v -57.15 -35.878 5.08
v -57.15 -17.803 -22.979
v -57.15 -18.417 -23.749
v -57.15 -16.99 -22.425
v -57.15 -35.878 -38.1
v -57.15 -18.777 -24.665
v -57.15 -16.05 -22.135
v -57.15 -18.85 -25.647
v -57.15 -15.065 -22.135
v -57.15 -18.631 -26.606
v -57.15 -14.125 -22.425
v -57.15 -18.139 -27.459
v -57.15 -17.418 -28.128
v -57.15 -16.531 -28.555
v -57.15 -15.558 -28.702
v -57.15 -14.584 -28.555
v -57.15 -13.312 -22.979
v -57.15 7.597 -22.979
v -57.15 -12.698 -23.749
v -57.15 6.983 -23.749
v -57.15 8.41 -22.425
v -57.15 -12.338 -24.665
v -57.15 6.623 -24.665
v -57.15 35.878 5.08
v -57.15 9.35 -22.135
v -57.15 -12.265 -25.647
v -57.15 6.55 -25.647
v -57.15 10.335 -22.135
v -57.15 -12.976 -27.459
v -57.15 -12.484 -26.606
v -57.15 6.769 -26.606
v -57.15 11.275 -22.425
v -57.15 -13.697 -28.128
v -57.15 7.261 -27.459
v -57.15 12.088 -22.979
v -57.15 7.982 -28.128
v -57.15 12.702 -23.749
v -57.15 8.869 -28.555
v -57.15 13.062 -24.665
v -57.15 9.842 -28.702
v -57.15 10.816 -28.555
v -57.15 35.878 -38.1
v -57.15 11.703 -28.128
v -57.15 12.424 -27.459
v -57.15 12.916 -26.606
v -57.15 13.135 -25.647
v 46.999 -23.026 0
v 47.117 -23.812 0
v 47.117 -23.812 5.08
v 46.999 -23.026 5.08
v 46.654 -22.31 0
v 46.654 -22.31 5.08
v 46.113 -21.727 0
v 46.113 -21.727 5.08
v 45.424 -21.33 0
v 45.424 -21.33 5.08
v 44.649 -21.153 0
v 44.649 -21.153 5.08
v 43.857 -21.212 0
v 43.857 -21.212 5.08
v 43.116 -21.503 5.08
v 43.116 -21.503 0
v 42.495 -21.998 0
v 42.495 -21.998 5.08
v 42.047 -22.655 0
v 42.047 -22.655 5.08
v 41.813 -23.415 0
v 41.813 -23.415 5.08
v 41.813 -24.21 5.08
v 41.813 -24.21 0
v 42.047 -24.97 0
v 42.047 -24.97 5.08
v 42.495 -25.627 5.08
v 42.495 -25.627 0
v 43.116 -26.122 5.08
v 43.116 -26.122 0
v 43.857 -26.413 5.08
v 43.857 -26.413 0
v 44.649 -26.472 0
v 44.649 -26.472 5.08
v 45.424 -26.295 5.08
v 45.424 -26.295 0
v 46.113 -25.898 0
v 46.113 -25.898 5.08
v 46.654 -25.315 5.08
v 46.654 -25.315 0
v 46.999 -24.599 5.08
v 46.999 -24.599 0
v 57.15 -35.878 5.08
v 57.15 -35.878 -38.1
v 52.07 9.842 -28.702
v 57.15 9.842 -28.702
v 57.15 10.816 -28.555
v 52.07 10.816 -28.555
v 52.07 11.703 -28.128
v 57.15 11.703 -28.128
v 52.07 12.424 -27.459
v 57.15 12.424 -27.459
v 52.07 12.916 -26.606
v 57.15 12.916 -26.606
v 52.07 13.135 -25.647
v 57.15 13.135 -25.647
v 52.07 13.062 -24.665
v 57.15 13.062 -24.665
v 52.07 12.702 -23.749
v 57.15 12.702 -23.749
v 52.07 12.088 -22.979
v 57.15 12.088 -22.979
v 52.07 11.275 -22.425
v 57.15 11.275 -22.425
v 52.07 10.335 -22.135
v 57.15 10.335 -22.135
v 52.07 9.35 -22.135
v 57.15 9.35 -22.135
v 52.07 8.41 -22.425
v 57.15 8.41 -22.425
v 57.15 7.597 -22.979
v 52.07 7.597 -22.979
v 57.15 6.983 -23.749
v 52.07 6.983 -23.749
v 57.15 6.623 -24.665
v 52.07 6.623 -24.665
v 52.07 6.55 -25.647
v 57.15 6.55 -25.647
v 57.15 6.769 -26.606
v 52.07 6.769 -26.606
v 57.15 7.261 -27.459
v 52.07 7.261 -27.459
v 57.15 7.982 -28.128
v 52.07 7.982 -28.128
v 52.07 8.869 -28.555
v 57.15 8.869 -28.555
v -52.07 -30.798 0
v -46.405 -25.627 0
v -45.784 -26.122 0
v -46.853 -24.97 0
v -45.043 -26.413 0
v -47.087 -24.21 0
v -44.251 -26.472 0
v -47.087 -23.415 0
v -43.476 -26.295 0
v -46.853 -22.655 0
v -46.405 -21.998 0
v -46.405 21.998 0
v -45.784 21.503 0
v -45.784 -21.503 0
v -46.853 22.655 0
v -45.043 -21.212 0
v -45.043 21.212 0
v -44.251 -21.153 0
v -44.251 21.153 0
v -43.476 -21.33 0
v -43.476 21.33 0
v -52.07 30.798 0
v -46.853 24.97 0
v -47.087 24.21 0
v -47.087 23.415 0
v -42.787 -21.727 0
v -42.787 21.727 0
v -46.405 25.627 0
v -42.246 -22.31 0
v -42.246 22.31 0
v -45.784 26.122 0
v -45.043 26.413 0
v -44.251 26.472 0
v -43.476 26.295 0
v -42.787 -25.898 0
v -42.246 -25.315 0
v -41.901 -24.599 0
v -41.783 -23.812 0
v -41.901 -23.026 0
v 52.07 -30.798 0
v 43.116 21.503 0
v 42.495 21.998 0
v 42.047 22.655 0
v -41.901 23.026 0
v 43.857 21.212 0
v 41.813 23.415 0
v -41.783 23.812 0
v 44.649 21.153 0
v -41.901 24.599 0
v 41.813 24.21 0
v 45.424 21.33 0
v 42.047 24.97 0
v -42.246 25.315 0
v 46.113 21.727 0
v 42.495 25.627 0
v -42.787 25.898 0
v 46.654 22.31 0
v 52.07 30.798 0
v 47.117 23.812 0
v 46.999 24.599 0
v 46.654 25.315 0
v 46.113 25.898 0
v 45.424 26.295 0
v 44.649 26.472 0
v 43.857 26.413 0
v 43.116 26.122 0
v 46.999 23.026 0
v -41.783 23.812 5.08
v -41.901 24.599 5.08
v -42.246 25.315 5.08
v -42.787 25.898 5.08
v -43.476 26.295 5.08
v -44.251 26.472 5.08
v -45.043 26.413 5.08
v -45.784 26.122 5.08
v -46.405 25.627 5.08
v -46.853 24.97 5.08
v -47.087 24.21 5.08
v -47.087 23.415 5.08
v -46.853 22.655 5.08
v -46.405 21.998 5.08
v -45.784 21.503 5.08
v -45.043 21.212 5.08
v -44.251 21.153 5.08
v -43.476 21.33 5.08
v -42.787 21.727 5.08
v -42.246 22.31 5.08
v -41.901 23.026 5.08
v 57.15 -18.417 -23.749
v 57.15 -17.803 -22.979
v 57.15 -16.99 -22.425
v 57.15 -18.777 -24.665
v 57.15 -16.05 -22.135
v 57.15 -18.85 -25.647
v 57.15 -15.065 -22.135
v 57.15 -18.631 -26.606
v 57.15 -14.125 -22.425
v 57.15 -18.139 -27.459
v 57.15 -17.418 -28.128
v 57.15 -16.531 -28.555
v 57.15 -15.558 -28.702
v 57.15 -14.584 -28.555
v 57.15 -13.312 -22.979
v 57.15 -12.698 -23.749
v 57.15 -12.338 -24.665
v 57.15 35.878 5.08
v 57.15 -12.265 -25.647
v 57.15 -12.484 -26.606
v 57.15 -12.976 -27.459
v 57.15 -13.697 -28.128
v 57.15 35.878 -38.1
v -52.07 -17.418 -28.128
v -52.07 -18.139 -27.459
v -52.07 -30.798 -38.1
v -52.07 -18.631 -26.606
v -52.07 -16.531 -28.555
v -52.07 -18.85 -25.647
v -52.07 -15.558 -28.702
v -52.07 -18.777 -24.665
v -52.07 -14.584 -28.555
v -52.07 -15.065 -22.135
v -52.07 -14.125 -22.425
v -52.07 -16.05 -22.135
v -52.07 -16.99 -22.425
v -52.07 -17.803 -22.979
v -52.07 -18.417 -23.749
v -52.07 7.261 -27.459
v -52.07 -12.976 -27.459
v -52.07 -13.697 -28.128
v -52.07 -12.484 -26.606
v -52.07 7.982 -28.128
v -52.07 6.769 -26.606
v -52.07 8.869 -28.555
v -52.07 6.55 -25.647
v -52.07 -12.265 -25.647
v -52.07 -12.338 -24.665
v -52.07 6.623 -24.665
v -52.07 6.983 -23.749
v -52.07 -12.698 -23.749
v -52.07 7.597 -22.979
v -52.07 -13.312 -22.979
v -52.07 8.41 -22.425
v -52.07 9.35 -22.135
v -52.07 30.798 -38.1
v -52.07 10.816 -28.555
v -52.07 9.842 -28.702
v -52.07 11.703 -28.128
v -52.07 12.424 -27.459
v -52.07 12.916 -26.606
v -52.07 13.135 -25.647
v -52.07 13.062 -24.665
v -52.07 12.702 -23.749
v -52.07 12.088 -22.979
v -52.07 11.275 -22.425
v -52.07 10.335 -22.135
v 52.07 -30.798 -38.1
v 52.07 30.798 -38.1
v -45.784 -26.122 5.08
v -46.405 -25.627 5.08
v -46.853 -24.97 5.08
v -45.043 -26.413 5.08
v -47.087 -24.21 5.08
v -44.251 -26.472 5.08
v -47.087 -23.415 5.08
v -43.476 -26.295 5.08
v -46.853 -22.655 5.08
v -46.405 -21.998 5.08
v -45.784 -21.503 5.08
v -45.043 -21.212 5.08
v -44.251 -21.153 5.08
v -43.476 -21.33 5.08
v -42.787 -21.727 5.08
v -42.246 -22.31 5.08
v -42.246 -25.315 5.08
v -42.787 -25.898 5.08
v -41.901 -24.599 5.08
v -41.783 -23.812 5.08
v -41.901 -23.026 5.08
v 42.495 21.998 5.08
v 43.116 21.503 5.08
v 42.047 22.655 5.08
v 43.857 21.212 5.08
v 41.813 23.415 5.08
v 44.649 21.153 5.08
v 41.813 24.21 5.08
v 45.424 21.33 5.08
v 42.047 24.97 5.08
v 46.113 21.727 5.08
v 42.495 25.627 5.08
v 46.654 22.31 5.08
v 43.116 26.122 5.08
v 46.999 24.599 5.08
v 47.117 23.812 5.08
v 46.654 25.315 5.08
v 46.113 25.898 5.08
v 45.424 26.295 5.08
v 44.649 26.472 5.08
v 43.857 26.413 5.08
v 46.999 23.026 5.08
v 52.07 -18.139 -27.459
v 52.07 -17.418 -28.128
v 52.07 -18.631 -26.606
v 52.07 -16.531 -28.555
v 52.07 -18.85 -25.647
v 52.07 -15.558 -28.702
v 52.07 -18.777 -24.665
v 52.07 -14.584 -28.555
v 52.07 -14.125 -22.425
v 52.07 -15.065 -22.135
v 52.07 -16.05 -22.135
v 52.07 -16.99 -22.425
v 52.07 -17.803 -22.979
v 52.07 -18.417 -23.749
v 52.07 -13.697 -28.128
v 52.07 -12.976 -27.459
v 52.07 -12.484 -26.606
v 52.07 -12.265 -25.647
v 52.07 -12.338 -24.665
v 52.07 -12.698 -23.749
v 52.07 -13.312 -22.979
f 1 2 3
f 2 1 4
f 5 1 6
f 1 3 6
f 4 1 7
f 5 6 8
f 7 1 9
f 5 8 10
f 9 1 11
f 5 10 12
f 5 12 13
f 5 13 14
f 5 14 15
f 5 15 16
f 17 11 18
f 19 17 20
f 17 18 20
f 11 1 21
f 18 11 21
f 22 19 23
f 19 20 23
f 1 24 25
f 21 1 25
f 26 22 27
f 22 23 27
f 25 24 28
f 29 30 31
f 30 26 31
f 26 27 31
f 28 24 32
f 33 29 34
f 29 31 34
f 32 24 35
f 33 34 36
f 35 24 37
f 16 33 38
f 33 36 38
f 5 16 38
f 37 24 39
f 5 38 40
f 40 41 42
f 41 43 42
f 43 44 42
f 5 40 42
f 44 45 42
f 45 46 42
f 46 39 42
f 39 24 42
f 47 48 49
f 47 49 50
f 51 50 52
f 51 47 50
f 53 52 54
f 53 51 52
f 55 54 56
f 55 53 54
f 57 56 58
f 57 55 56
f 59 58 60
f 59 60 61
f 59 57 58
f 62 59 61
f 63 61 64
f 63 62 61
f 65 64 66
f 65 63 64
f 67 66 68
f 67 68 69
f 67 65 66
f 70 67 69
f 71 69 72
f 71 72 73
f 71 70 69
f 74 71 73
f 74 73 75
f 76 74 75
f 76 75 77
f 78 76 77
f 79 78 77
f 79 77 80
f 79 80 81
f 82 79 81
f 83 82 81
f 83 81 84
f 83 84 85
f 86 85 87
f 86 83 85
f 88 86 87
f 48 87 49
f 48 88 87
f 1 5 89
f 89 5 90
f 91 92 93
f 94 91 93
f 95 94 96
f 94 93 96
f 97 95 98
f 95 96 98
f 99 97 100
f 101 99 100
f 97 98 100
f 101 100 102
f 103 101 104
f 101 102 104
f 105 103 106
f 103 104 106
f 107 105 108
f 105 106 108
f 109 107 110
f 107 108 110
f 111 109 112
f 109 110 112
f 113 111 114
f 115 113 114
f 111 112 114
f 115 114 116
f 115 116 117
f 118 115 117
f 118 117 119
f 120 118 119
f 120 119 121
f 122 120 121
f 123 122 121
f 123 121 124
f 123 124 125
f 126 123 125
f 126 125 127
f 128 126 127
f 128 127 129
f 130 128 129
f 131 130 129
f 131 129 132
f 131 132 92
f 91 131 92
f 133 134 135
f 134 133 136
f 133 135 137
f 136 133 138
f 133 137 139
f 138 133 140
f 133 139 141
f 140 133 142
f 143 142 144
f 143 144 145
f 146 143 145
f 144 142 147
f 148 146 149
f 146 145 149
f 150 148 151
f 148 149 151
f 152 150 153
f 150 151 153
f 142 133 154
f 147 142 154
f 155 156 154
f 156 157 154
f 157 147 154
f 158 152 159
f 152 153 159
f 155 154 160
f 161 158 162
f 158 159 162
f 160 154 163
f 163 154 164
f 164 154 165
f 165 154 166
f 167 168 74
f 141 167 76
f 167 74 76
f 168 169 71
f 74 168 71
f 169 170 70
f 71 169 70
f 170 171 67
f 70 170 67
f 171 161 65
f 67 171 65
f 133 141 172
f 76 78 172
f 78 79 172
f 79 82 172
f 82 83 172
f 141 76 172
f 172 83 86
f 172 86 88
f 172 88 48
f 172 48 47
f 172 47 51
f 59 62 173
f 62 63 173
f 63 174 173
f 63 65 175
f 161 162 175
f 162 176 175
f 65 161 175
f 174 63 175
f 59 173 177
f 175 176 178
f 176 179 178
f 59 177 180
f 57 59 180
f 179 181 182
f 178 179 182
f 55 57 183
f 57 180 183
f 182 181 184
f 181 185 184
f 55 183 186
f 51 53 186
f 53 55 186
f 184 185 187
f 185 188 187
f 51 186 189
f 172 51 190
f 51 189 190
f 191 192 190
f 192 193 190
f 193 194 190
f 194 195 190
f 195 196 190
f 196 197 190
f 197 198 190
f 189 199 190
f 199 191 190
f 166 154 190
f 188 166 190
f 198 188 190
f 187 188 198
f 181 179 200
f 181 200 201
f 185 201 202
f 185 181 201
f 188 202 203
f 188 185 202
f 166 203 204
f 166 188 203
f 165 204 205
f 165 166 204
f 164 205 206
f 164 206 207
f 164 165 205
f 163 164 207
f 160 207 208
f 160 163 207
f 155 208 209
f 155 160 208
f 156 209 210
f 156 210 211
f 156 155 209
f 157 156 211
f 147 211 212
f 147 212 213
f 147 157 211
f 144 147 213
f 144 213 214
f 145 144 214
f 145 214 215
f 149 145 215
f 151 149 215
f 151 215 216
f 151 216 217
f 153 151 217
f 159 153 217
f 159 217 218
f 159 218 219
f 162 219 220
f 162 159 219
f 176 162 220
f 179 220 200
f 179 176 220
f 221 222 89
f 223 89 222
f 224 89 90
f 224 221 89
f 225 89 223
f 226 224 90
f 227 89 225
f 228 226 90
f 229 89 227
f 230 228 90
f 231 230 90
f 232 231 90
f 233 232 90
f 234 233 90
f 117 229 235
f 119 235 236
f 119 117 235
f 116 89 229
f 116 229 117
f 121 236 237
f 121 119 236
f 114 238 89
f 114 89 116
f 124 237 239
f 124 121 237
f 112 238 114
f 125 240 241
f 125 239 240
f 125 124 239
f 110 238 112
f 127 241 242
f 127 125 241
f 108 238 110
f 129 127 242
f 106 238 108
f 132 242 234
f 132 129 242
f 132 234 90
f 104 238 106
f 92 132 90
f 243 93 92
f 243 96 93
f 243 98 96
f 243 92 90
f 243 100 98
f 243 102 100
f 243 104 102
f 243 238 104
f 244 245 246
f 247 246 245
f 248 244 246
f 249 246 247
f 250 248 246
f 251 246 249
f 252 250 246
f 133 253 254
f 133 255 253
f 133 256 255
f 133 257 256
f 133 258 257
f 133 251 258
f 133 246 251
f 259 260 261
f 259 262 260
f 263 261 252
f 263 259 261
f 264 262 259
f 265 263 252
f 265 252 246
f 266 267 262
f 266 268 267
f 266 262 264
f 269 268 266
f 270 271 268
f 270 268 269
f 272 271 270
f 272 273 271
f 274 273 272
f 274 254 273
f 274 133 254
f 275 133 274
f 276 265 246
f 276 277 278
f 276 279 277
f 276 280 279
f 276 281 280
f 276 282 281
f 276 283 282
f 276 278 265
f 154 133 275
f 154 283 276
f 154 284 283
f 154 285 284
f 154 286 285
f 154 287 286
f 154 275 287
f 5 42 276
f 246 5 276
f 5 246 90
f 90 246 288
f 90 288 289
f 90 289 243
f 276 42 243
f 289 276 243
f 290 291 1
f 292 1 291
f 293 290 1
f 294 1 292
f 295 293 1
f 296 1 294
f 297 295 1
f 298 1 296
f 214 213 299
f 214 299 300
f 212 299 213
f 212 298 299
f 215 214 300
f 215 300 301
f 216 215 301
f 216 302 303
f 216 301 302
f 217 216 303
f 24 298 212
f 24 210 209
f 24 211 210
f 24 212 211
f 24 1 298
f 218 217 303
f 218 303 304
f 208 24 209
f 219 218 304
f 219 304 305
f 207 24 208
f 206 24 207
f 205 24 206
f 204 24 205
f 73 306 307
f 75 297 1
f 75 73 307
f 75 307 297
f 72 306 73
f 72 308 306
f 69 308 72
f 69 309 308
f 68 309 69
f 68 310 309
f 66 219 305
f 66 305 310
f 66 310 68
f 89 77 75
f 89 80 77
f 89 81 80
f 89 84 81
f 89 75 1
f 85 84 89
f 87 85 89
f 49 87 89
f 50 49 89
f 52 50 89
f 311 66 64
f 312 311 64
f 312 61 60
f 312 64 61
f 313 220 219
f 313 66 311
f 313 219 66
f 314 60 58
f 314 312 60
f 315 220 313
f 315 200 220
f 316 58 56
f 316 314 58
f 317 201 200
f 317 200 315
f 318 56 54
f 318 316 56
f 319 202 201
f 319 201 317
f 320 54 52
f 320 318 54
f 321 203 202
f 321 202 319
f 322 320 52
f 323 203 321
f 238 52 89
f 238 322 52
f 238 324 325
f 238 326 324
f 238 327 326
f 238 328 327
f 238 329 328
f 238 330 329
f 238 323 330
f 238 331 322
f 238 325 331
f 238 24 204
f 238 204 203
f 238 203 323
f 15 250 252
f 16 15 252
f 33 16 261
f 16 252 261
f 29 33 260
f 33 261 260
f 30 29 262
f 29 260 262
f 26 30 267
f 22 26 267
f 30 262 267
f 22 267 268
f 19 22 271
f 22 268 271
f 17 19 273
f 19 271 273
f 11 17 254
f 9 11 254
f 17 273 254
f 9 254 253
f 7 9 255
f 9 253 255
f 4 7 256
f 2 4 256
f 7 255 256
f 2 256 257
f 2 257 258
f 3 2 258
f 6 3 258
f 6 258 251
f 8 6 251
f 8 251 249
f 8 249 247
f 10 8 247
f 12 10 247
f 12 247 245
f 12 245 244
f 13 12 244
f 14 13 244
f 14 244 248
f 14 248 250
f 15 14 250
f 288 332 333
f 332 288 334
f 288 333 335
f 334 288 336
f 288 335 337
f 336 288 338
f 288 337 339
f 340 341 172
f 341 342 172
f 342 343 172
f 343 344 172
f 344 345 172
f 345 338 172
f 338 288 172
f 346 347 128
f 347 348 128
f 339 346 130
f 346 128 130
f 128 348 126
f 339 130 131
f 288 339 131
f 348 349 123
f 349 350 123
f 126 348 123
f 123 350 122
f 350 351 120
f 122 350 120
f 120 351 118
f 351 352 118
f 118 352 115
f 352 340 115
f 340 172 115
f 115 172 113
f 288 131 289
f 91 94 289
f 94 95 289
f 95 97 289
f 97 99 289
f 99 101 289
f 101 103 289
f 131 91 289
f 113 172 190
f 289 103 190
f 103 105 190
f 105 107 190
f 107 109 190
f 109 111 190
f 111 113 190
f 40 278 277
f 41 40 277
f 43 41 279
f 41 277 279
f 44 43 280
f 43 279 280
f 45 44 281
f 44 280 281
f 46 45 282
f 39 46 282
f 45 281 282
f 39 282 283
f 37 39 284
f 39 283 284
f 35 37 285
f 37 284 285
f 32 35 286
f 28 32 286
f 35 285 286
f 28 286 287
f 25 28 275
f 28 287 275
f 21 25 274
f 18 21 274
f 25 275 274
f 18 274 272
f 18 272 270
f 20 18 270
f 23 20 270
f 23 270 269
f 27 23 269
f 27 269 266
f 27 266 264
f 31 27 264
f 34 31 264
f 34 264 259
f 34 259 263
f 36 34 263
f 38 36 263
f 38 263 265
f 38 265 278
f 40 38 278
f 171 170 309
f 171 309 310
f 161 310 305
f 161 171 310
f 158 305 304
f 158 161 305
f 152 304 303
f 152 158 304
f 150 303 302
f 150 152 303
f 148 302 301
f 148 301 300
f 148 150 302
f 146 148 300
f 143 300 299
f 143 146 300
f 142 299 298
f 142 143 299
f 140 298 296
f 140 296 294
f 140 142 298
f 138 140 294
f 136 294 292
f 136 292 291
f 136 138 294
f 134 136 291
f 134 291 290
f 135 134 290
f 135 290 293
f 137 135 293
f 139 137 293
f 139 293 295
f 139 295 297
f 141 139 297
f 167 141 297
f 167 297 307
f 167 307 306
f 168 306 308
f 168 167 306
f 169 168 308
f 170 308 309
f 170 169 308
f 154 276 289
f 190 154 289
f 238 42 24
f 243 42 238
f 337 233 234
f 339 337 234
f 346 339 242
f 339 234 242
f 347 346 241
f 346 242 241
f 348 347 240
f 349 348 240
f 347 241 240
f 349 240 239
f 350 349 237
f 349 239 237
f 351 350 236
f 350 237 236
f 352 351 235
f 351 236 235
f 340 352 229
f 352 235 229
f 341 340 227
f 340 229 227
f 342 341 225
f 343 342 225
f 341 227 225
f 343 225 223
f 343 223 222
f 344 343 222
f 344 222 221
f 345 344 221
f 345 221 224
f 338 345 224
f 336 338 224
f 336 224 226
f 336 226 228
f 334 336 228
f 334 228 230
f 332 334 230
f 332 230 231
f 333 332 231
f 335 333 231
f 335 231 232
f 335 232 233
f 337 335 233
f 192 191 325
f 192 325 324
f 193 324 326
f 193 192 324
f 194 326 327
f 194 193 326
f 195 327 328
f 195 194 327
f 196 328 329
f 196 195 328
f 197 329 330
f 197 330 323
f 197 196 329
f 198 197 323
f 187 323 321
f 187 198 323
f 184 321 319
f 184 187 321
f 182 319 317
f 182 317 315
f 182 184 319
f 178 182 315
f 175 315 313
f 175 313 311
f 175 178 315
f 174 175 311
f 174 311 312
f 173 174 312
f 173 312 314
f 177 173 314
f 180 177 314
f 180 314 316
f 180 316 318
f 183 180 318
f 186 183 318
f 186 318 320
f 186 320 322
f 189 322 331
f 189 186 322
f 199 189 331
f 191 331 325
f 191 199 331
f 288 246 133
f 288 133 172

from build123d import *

# Parameters (mm, degrees)
SKETCH1_W           = 5.08
SKETCH1_H           = 61.595
SKETCH1_W_2         = 104.14
SKETCH1_R           = 2.667
BOSS_EXTRUDE1_DEPTH = 5.08
SKETCH1_3_W         = 5.08
SKETCH1_3_H         = 61.595
BOSS_EXTRUDE2_DEPTH = 38.1
SKETCH2_R           = 3.302
CUT_EXTRUDE1_DEPTH  = 125.356688627
SKETCH3_W           = 114.3
SKETCH3_H           = 43.18
BOSS_EXTRUDE3_DEPTH = 5.08
BOSS_EXTRUDE4_START = -61.595
SKETCH3_3_W         = 114.3
SKETCH3_3_H         = 43.18
BOSS_EXTRUDE4_DEPTH = 5.08


with BuildPart() as part:
    # Sketch1 → Boss-Extrude1 (new body)
    # profile 1 of 3: a face of its own
    with BuildSketch(Plane.XY):
        with Locations((-54.61, 0)):
            Rectangle(SKETCH1_W, SKETCH1_H)
    # profile 2 of 3: a face of its own
    with BuildSketch(Plane.XY):
        Rectangle(SKETCH1_W_2, SKETCH1_H)
        with Locations((-44.45, -23.8125)):
            Circle(SKETCH1_R, mode=Mode.SUBTRACT)
        with Locations((44.45, -23.8125)):
            Circle(SKETCH1_R, mode=Mode.SUBTRACT)
        with Locations((-44.45, 23.8125)):
            Circle(SKETCH1_R, mode=Mode.SUBTRACT)
        with Locations((44.45, 23.8125)):
            Circle(SKETCH1_R, mode=Mode.SUBTRACT)
    # profile 3 of 3: a face of its own
    with BuildSketch(Plane.XY):
        with Locations((54.61, 0)):
            Rectangle(SKETCH1_W, SKETCH1_H)
    extrude(amount=BOSS_EXTRUDE1_DEPTH)

    # Sketch1<3> → Boss-Extrude2 (add)
    with BuildSketch(Plane.XY):
        with Locations((-54.61, 0)):
            Rectangle(SKETCH1_3_W, SKETCH1_3_H)
        with Locations((54.61, 0)):
            Rectangle(SKETCH1_3_W, SKETCH1_3_H)
    extrude(amount=-BOSS_EXTRUDE2_DEPTH)

    # Sketch2 → Cut-Extrude1 (cut, through all)
    with BuildSketch(Plane(origin=(57.15, 0, 0), x_dir=(0, 0, -1), z_dir=(1, 0, 0))):
        with Locations((25.4, -15.5575)):
            Circle(SKETCH2_R)
        with Locations((25.4, 9.8425)):
            Circle(SKETCH2_R)
    extrude(amount=-CUT_EXTRUDE1_DEPTH, mode=Mode.SUBTRACT)

    # Sketch3 → Boss-Extrude3 (add)
    with BuildSketch(Plane(origin=(0, 30.7975, 0), x_dir=(1, 0, 0), z_dir=(0, 1, 0))):
        with Locations((0, 16.51)):
            Rectangle(SKETCH3_W, SKETCH3_H)
    extrude(amount=BOSS_EXTRUDE3_DEPTH)

    # Sketch3<3> → Boss-Extrude4 (add)
    with BuildSketch(Plane(origin=(0, 30.7975, 0), x_dir=(1, 0, 0), z_dir=(0, 1, 0)).offset(BOSS_EXTRUDE4_START)):
        with Locations((0, 16.51)):
            Rectangle(SKETCH3_3_W, SKETCH3_3_H)
    extrude(amount=-BOSS_EXTRUDE4_DEPTH)


solid = part.part
